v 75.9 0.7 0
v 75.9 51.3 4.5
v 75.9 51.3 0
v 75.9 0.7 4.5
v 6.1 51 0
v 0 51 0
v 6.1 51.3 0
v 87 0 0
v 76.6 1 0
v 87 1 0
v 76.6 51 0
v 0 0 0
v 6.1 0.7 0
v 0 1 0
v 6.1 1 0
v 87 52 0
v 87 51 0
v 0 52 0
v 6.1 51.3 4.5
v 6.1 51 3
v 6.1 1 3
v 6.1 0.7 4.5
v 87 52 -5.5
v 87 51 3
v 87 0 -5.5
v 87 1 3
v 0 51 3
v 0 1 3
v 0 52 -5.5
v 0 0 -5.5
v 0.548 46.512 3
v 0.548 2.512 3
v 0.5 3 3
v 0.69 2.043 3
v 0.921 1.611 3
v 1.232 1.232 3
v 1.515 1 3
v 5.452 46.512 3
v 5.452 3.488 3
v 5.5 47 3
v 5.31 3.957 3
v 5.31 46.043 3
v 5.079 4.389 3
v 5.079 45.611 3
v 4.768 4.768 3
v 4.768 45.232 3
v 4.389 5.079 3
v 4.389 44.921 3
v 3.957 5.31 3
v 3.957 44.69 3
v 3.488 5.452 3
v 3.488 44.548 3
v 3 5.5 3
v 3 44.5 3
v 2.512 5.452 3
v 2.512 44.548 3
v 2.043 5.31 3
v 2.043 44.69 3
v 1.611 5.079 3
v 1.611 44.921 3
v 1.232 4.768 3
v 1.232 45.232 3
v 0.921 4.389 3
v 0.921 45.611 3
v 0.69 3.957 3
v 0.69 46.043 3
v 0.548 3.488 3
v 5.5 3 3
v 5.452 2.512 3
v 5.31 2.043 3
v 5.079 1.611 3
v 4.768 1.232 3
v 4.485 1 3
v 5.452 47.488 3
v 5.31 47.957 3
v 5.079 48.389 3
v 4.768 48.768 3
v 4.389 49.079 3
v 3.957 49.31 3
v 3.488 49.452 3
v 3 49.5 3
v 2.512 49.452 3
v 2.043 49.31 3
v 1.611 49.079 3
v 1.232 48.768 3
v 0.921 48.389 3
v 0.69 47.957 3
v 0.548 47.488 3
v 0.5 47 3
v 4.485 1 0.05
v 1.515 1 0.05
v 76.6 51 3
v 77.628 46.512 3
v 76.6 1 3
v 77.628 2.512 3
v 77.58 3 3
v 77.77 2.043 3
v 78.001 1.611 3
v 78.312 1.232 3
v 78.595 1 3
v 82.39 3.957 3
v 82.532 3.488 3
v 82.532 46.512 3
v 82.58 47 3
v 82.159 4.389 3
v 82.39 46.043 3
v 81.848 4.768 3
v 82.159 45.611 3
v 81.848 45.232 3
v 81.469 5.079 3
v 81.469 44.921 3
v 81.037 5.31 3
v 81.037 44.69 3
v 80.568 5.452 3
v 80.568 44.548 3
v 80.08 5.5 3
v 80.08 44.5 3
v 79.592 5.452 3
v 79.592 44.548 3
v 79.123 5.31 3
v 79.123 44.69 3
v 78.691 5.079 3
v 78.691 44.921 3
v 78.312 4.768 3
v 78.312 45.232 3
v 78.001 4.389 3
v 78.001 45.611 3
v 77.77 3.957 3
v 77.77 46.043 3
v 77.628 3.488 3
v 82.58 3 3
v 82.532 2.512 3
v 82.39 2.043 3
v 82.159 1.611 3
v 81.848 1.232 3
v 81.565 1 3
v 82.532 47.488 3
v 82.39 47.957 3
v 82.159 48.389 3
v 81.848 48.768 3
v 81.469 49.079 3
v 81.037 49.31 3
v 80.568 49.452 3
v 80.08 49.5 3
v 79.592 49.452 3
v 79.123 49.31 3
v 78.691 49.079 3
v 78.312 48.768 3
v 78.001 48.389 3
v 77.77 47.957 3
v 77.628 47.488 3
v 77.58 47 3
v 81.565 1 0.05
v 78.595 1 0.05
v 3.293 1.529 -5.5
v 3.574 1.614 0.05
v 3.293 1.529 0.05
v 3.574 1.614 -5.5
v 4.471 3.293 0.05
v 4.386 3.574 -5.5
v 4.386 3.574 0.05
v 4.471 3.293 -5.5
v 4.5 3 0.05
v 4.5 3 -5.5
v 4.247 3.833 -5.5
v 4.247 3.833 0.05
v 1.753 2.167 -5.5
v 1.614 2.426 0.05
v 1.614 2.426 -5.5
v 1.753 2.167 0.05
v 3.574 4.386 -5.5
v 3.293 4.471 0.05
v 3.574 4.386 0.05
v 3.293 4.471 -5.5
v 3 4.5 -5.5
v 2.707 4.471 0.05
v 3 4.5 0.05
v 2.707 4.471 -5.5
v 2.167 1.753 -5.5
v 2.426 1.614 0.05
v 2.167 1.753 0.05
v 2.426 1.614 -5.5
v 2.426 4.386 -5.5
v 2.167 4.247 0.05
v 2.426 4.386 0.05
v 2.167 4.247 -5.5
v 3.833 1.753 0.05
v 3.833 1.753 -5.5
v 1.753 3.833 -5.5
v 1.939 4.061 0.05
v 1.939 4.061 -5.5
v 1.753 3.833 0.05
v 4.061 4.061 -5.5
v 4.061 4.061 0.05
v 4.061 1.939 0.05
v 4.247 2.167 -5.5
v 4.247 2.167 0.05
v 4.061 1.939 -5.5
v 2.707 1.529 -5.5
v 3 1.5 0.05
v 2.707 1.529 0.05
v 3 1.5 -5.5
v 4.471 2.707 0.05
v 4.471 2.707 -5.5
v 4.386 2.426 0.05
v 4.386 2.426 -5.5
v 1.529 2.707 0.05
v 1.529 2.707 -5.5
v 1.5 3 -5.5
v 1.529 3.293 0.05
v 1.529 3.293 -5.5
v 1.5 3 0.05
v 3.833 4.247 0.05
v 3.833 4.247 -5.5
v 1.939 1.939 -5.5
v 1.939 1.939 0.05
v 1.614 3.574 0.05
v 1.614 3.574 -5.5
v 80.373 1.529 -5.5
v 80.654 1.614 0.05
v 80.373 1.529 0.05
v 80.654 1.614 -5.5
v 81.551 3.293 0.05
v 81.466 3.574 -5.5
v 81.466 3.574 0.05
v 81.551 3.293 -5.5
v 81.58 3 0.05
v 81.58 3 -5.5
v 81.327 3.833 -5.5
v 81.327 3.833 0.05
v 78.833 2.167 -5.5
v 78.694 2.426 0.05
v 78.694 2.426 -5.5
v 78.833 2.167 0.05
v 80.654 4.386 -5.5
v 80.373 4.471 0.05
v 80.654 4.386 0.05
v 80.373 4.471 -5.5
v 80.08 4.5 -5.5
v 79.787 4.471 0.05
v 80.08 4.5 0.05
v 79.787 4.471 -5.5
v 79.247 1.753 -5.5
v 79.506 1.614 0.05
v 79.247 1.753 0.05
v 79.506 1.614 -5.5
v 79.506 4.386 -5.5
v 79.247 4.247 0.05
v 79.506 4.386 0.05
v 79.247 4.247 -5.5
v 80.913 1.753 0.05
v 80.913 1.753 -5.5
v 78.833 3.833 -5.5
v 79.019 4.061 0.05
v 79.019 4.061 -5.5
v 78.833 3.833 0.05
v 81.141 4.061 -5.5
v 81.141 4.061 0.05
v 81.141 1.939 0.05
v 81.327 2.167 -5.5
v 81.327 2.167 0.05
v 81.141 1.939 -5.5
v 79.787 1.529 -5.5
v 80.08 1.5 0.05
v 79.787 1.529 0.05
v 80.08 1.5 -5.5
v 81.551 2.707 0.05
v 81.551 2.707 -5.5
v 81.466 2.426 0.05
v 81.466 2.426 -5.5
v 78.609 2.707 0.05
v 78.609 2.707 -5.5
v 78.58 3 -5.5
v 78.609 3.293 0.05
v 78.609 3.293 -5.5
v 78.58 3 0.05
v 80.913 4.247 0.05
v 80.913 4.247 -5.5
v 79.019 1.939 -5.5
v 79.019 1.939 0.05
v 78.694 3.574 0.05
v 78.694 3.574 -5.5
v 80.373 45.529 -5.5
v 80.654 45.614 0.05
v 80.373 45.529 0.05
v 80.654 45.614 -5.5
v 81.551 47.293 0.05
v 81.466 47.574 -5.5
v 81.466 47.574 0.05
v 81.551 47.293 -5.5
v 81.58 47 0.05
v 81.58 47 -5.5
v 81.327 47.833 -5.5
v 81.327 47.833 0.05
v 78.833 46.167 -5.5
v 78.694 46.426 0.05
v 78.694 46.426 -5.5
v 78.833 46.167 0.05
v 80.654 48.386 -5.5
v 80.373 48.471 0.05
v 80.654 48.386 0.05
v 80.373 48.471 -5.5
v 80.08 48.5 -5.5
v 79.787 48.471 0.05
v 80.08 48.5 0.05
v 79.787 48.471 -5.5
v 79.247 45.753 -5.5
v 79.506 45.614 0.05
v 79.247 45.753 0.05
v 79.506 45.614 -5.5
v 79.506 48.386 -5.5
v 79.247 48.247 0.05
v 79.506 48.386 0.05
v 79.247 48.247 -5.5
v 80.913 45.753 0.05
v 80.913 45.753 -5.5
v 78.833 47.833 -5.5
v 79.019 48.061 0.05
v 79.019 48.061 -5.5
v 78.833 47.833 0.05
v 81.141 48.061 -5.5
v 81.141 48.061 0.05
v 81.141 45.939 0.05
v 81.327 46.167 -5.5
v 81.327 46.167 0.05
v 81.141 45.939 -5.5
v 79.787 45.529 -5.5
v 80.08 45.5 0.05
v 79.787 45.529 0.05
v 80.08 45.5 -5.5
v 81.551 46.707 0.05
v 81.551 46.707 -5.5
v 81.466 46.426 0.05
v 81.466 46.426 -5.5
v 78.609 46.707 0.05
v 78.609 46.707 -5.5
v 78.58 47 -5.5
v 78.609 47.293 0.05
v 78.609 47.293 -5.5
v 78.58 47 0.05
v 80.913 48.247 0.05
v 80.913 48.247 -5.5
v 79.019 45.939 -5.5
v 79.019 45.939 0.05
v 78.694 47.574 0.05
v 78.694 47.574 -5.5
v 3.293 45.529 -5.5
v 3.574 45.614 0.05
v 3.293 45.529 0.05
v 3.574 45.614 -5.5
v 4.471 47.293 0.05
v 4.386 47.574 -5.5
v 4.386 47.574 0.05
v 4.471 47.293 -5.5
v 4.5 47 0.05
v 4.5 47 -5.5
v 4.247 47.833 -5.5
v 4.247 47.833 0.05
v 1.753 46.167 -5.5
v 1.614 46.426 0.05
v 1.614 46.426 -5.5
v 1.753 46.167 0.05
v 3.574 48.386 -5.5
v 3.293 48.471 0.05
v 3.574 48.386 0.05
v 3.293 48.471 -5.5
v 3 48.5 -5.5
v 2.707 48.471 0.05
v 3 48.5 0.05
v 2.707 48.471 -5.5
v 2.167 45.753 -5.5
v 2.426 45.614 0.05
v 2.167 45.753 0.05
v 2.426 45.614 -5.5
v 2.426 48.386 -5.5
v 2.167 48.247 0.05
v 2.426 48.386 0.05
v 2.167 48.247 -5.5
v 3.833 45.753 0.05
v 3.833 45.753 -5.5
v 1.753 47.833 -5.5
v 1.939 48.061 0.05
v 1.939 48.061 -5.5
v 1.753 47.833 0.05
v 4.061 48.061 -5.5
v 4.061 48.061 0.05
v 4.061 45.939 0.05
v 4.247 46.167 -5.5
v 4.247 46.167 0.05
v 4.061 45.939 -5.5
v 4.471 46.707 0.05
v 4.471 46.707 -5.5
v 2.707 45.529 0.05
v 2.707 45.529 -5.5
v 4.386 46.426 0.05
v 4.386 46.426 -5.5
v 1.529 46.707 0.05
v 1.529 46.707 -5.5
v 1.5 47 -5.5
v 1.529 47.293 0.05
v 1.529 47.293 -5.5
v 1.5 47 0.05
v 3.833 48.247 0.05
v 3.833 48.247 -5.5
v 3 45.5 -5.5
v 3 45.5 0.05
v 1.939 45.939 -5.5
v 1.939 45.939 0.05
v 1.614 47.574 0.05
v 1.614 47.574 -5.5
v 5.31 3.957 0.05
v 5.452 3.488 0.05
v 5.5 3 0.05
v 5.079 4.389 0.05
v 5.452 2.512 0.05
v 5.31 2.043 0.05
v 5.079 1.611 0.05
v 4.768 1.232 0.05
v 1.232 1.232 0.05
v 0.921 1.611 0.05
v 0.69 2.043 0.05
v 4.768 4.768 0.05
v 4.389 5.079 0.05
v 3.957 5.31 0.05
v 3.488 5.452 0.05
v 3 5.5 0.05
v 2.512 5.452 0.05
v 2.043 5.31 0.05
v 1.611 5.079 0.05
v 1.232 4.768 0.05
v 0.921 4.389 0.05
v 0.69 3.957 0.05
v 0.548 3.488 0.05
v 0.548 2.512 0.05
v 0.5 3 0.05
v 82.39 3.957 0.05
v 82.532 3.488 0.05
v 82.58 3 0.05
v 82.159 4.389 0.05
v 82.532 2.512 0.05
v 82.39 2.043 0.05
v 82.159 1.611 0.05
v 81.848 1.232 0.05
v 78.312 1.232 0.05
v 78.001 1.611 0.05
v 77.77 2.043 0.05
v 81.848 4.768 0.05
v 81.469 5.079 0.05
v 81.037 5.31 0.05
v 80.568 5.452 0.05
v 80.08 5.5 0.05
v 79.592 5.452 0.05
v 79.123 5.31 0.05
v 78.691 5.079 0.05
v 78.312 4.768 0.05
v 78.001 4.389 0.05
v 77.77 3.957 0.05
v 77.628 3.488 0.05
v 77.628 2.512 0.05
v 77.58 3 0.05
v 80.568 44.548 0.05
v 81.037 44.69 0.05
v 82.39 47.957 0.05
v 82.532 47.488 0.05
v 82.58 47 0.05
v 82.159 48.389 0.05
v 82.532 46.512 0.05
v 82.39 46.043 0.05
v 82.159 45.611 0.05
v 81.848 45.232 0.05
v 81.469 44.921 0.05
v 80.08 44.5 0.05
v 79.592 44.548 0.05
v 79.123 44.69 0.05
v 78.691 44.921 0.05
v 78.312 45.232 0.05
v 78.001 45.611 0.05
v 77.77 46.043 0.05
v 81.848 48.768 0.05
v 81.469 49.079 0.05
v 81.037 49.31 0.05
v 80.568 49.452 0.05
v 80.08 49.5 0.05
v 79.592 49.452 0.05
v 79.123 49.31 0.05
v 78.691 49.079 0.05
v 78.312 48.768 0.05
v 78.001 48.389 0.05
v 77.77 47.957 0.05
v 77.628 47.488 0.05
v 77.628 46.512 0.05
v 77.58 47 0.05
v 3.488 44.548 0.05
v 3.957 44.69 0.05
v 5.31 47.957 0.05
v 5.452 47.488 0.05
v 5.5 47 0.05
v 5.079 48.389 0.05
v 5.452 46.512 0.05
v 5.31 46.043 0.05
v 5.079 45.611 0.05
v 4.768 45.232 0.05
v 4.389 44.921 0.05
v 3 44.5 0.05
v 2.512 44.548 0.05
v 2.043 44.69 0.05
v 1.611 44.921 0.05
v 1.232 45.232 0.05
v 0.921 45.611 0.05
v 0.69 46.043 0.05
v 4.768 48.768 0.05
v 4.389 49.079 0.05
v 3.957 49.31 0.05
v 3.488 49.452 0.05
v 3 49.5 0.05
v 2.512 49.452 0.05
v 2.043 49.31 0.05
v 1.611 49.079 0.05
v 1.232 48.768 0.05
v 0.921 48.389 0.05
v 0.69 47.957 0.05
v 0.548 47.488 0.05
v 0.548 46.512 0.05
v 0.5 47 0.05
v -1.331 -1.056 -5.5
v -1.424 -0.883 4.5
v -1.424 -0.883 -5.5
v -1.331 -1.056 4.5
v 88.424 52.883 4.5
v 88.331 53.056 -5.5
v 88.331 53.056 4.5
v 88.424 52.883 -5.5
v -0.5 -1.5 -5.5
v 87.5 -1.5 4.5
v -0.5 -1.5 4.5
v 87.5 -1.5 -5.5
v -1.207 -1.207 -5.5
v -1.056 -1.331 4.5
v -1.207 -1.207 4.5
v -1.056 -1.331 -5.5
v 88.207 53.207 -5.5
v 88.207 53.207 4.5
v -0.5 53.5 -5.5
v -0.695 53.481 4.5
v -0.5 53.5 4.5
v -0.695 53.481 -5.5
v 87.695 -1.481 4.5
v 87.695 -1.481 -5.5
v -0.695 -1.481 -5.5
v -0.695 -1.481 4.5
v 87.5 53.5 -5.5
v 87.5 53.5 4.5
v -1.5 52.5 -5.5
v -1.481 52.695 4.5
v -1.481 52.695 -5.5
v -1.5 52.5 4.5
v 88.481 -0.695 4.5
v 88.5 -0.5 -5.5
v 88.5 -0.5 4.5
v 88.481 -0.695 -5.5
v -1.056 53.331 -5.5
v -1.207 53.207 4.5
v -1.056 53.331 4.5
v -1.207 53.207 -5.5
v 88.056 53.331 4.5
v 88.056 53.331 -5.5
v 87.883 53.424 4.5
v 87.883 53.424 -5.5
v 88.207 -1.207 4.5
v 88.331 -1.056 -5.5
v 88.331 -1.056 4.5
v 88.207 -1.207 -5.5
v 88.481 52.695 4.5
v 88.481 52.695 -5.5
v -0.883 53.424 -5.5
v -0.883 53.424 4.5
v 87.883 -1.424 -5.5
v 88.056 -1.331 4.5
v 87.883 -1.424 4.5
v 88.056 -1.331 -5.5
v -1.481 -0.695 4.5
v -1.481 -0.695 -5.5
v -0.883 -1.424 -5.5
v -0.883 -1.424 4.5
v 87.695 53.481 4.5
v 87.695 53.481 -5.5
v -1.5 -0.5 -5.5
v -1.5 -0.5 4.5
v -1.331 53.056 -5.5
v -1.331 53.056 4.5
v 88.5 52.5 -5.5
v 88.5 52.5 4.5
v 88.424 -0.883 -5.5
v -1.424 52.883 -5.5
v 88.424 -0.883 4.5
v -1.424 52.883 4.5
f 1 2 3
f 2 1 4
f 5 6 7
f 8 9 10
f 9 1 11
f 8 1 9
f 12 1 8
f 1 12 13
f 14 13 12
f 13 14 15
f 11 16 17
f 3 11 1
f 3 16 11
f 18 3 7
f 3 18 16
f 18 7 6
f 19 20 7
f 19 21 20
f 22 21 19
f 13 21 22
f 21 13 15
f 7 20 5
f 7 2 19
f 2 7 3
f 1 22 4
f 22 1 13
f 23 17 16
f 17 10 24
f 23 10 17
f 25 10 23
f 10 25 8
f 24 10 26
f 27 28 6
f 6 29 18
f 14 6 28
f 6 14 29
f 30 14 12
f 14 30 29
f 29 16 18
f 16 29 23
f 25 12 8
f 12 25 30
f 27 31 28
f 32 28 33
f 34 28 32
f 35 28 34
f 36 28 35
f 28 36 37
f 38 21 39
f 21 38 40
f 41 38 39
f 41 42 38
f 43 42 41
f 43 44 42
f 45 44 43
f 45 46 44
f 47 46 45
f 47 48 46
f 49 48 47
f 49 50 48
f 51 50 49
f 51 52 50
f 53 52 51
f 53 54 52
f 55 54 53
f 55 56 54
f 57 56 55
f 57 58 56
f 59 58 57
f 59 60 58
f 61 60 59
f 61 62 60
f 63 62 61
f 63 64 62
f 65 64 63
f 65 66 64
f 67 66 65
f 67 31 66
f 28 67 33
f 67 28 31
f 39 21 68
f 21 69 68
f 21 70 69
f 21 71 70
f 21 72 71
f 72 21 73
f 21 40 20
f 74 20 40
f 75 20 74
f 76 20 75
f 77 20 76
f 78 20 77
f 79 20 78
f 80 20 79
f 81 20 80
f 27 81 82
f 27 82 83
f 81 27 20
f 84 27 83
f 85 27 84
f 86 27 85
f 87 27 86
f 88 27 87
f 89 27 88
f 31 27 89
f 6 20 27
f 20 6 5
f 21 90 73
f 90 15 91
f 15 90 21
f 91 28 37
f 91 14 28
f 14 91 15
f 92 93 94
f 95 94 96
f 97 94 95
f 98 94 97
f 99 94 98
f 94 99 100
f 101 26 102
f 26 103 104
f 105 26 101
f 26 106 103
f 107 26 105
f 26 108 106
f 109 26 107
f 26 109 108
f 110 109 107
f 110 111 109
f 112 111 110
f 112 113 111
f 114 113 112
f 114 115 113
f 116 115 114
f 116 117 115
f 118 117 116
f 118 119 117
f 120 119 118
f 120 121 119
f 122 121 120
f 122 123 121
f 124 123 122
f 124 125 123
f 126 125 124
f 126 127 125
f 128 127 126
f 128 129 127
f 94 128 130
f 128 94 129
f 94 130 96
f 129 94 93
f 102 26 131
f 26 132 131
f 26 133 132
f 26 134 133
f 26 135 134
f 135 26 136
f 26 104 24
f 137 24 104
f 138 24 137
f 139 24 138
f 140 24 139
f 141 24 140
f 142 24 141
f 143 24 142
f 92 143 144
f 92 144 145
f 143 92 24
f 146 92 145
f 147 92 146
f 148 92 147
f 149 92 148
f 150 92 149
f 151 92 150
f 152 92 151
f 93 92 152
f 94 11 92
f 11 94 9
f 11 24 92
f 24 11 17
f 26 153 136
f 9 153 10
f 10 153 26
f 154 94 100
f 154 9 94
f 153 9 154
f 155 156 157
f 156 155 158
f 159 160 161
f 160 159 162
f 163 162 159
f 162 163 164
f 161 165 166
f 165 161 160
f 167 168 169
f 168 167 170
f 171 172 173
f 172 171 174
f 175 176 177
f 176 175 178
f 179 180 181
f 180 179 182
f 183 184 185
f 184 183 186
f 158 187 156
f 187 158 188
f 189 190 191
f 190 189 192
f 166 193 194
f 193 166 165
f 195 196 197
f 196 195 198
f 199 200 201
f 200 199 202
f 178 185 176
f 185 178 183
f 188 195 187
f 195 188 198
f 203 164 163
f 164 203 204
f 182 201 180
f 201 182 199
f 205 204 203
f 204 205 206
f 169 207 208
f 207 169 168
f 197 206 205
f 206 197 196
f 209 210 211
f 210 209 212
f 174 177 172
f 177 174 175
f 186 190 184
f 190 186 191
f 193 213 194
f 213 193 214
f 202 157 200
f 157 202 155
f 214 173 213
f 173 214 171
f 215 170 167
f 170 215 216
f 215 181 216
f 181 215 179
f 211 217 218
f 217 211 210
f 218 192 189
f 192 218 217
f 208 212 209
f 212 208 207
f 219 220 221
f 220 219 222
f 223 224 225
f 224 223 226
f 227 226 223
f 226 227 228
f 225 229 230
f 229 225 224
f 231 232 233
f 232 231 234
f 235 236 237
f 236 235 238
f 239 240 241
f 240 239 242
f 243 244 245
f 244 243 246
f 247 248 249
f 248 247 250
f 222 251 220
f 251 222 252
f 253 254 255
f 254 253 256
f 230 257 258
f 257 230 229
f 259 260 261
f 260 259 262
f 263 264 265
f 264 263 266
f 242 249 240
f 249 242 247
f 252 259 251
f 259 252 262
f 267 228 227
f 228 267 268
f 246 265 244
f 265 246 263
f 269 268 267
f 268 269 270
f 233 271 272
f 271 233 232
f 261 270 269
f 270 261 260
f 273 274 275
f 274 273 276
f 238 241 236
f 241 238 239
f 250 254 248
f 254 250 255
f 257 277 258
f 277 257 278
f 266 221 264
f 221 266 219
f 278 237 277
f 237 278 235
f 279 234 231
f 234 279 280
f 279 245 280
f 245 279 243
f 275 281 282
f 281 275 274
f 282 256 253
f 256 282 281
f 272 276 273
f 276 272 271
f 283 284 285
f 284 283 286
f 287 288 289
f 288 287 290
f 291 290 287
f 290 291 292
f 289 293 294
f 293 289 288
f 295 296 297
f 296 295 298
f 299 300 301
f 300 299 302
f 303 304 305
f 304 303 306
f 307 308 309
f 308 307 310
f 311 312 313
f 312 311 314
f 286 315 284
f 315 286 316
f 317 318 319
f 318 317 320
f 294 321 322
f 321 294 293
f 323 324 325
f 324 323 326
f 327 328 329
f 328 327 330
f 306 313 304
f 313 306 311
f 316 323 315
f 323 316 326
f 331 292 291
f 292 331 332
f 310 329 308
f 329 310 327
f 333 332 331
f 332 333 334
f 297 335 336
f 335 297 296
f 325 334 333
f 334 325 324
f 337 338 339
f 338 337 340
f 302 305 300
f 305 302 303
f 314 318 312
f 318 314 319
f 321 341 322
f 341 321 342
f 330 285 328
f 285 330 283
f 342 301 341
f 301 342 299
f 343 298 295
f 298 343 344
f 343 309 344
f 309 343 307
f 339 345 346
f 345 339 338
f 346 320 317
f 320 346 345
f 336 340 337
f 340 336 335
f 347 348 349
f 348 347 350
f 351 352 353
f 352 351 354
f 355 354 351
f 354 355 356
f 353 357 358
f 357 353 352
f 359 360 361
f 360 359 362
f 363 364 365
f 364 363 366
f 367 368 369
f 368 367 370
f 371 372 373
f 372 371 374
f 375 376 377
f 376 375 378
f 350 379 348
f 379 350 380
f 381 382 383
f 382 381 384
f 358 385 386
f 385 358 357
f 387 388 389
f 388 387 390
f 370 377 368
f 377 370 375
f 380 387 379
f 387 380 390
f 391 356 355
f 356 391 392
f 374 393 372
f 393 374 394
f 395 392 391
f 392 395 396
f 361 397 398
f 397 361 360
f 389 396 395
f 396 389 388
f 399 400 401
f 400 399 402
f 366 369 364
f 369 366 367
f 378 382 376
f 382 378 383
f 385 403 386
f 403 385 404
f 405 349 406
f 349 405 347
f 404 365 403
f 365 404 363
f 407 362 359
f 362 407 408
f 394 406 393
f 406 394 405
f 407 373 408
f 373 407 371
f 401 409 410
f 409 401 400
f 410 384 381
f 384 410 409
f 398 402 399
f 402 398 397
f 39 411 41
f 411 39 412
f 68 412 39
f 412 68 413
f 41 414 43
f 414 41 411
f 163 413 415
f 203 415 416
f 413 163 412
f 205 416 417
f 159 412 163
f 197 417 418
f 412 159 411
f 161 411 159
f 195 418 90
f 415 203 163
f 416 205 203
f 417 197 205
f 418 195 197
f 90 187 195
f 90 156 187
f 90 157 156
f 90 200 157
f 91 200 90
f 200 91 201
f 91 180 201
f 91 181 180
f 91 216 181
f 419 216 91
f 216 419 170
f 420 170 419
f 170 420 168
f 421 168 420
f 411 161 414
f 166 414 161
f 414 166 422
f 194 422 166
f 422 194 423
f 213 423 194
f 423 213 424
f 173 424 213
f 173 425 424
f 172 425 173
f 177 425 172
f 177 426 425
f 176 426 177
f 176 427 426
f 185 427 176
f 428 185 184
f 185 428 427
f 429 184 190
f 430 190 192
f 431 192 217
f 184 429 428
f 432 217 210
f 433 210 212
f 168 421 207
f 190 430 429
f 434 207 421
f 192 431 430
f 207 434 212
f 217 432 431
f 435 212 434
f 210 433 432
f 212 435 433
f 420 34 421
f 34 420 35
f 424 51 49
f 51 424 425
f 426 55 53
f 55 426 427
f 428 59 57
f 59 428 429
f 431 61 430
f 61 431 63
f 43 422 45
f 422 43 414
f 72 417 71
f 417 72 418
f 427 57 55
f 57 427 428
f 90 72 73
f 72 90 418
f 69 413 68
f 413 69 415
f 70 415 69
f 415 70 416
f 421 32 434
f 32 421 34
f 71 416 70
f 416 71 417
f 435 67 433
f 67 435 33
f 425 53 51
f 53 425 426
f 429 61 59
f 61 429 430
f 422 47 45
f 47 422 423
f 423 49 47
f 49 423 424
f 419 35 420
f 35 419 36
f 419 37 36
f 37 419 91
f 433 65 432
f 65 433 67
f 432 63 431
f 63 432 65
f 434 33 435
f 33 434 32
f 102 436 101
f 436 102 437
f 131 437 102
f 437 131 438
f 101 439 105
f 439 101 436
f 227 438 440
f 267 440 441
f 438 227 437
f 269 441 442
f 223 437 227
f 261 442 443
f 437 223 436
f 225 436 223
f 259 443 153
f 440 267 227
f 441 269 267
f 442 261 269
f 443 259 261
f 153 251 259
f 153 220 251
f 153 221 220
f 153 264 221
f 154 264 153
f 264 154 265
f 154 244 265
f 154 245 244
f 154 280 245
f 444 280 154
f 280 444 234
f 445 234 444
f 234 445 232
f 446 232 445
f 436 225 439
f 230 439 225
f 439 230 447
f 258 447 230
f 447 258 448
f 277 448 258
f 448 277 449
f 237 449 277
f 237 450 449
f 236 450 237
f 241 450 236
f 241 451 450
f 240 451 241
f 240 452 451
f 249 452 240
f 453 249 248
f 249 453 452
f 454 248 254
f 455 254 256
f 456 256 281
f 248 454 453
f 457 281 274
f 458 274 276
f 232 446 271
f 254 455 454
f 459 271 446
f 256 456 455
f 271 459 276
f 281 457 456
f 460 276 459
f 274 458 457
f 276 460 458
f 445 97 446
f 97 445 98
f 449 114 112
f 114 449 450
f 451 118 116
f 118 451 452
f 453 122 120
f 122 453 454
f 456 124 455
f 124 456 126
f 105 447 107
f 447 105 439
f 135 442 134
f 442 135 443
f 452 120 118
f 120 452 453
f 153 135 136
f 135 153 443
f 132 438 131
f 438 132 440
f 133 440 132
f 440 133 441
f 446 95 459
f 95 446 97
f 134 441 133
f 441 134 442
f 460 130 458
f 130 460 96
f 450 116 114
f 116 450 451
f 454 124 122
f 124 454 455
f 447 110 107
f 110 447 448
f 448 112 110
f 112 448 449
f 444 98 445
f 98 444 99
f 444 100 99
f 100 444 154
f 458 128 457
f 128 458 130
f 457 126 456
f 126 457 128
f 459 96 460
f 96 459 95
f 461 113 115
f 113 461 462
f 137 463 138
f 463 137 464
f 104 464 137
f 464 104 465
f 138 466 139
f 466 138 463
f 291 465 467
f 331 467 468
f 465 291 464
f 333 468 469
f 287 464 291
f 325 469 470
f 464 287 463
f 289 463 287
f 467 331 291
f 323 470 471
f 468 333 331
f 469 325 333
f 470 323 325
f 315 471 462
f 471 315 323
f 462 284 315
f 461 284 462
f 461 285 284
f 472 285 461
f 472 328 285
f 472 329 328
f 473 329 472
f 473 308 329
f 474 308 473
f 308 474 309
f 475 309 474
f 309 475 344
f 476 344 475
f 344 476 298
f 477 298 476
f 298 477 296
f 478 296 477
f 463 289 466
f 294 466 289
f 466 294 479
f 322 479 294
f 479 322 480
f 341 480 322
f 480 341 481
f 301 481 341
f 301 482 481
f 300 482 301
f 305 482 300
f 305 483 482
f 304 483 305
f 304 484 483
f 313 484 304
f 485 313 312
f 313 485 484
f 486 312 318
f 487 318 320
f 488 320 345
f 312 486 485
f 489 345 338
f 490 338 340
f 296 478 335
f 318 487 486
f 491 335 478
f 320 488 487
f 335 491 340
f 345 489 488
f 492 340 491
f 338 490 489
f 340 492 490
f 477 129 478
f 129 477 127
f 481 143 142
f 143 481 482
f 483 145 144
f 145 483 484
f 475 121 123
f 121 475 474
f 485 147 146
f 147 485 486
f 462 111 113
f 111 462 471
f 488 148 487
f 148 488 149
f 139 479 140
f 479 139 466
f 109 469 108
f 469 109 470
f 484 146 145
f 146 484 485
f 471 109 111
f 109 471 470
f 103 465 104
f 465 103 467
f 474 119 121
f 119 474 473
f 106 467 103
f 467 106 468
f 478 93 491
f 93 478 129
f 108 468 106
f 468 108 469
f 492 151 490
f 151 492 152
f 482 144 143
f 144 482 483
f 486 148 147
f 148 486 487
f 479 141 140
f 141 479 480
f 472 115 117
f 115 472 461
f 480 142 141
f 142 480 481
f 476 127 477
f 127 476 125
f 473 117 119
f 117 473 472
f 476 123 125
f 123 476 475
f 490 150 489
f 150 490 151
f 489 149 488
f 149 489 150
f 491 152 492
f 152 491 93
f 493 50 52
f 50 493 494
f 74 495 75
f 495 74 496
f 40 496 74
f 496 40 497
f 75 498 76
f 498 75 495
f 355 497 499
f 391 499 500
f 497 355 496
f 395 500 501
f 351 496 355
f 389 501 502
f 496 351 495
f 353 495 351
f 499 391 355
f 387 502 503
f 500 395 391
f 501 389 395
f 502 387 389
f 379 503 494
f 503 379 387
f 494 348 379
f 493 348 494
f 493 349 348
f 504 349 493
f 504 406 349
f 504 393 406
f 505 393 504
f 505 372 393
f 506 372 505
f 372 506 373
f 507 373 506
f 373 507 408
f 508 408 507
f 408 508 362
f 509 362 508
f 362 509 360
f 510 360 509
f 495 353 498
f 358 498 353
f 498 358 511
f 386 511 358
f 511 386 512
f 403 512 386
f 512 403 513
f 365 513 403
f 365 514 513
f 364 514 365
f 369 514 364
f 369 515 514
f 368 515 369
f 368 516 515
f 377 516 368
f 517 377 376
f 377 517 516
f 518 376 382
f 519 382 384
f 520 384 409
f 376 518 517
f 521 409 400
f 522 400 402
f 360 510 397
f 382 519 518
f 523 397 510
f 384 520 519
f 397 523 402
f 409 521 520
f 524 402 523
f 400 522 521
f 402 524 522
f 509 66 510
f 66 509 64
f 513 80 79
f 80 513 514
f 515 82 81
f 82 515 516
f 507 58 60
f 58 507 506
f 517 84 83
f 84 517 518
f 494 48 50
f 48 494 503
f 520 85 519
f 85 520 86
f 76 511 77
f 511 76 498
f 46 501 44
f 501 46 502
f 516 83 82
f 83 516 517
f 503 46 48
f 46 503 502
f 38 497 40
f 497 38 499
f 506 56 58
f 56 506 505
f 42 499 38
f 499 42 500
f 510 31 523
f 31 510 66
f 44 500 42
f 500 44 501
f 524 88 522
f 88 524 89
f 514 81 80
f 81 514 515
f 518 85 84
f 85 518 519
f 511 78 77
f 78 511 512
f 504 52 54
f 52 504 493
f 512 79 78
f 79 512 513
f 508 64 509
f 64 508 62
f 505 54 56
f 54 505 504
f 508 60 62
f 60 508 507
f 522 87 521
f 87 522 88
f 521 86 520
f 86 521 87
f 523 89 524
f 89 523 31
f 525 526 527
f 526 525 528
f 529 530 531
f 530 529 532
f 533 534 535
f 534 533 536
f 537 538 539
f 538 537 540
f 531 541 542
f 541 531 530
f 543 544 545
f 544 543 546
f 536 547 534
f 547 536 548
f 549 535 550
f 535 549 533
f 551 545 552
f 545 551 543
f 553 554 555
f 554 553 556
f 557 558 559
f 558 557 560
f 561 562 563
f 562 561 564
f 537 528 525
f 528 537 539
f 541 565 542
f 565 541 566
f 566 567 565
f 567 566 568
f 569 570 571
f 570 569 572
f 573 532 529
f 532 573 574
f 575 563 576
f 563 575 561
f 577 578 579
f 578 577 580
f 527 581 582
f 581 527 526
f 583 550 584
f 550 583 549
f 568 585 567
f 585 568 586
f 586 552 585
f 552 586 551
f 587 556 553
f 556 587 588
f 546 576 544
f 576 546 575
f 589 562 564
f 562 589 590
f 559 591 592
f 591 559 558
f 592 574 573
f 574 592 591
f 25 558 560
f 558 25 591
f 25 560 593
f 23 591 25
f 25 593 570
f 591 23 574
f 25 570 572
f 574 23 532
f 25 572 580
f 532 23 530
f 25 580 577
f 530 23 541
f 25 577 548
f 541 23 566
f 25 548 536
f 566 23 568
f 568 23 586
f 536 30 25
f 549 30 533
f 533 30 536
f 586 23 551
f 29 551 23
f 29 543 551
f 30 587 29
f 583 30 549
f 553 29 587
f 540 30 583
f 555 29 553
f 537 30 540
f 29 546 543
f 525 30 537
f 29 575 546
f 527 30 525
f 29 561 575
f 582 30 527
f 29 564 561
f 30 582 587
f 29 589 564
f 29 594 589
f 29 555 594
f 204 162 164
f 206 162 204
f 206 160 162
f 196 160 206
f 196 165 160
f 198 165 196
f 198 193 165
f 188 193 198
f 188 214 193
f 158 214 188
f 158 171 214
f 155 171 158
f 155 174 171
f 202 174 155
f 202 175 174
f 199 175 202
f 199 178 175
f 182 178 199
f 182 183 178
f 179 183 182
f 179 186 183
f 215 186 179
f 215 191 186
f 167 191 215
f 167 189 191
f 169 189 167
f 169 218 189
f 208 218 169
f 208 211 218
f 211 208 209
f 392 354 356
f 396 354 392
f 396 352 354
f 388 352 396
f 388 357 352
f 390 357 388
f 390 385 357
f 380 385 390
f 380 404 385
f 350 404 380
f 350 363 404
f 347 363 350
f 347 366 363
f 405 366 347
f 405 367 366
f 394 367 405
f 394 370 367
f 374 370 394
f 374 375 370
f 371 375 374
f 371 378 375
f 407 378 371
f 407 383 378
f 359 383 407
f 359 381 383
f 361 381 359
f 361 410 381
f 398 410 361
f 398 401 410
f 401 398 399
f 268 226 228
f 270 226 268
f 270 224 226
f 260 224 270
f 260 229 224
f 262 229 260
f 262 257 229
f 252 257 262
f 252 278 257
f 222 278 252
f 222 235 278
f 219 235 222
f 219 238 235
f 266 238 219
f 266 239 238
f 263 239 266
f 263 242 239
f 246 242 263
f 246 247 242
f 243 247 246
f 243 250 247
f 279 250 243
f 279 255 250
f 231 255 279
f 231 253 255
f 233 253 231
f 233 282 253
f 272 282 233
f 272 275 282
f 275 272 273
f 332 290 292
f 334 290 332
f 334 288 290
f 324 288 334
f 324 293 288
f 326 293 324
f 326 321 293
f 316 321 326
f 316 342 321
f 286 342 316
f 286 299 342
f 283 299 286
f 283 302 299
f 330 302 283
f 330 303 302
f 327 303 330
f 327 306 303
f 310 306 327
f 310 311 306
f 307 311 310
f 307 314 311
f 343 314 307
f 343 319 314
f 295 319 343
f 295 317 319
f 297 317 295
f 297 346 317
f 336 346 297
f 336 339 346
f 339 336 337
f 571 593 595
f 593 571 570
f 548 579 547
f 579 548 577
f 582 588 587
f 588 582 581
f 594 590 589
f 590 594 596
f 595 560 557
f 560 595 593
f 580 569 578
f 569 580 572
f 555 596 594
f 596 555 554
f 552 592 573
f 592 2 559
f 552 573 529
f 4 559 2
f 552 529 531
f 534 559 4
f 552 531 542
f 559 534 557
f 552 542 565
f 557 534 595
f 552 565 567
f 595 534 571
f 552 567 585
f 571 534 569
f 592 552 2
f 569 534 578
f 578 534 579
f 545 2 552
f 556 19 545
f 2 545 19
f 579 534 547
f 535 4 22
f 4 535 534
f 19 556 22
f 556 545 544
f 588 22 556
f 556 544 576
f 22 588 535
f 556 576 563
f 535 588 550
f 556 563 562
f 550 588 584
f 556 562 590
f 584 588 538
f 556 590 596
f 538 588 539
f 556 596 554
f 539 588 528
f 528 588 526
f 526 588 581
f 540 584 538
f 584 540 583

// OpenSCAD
// all dimensions in mm
// https://www.pjrc.com/store/display_ili9341_touch.html

screen_height = 50;
screen_width = 69.2;
screen_depth = 4;
screen_clearance = 0.6;

pcb_height = 52;
pcb_width = 87;
pcb_depth = 6;

screen_offset_width = 1;
screen_offset_height = 6.4;

hole_clearance=1.0;

// TODO: minkowski the top edges

module pcb_hole() {
  cylinder(h=pcb_depth+screen_depth+4,d=4-hole_clearance, center=true, $fn=32);
}

module pcb_standoff() {
  cylinder(h=screen_depth+0.1,d=5, center=true, $fn=32);
}

module display_ili9341_hull_void() { 
  difference() {
    union() {
      translate([screen_offset_height-0.3, screen_offset_width-0.3,0]) {
        cube([screen_width+0.6,screen_height+0.6,screen_depth + screen_clearance]);
      }
      translate([0,0,-pcb_depth]) {
        cube([pcb_width,pcb_height,pcb_depth]);
      }
      // Additional clearance above PCB beyond screen end
      translate([0,1,0]) cube([screen_offset_height, pcb_height-2,screen_depth-1]);
      translate([pcb_width-10.4,1,0]) cube([10.4, pcb_height-2,screen_depth-1]);
    }
    translate([3,3,-pcb_depth/2]) pcb_hole();
    translate([pcb_width-6.92,3,-pcb_depth/2]) pcb_hole();
    translate([pcb_width-6.92,pcb_height-5,-pcb_depth/2]) pcb_hole();
    translate([3,pcb_height-5,-pcb_depth/2]) pcb_hole();
    
    translate([3,3,screen_depth/2+0.1]) pcb_standoff();
    translate([pcb_width-6.92,3,screen_depth/2+0.1]) pcb_standoff();
    translate([pcb_width-6.92,pcb_height-5,screen_depth/2+0.1]) pcb_standoff();
    translate([3,pcb_height-5,screen_depth/2+0.1]) pcb_standoff();
  }  
}

union() { 
  difference()  {
     translate([-0.5,-0.5,3-pcb_depth]) { 
         minkowski() {
           cube([pcb_width+1,pcb_height+1,(pcb_depth+screen_depth)/2]);
           cylinder(r=1,h=(pcb_depth+screen_depth)/2, center=true, $fn=32);
         }
       }
     display_ili9341_hull_void();
    }
  }
  
*display_ili9341_hull_void();
